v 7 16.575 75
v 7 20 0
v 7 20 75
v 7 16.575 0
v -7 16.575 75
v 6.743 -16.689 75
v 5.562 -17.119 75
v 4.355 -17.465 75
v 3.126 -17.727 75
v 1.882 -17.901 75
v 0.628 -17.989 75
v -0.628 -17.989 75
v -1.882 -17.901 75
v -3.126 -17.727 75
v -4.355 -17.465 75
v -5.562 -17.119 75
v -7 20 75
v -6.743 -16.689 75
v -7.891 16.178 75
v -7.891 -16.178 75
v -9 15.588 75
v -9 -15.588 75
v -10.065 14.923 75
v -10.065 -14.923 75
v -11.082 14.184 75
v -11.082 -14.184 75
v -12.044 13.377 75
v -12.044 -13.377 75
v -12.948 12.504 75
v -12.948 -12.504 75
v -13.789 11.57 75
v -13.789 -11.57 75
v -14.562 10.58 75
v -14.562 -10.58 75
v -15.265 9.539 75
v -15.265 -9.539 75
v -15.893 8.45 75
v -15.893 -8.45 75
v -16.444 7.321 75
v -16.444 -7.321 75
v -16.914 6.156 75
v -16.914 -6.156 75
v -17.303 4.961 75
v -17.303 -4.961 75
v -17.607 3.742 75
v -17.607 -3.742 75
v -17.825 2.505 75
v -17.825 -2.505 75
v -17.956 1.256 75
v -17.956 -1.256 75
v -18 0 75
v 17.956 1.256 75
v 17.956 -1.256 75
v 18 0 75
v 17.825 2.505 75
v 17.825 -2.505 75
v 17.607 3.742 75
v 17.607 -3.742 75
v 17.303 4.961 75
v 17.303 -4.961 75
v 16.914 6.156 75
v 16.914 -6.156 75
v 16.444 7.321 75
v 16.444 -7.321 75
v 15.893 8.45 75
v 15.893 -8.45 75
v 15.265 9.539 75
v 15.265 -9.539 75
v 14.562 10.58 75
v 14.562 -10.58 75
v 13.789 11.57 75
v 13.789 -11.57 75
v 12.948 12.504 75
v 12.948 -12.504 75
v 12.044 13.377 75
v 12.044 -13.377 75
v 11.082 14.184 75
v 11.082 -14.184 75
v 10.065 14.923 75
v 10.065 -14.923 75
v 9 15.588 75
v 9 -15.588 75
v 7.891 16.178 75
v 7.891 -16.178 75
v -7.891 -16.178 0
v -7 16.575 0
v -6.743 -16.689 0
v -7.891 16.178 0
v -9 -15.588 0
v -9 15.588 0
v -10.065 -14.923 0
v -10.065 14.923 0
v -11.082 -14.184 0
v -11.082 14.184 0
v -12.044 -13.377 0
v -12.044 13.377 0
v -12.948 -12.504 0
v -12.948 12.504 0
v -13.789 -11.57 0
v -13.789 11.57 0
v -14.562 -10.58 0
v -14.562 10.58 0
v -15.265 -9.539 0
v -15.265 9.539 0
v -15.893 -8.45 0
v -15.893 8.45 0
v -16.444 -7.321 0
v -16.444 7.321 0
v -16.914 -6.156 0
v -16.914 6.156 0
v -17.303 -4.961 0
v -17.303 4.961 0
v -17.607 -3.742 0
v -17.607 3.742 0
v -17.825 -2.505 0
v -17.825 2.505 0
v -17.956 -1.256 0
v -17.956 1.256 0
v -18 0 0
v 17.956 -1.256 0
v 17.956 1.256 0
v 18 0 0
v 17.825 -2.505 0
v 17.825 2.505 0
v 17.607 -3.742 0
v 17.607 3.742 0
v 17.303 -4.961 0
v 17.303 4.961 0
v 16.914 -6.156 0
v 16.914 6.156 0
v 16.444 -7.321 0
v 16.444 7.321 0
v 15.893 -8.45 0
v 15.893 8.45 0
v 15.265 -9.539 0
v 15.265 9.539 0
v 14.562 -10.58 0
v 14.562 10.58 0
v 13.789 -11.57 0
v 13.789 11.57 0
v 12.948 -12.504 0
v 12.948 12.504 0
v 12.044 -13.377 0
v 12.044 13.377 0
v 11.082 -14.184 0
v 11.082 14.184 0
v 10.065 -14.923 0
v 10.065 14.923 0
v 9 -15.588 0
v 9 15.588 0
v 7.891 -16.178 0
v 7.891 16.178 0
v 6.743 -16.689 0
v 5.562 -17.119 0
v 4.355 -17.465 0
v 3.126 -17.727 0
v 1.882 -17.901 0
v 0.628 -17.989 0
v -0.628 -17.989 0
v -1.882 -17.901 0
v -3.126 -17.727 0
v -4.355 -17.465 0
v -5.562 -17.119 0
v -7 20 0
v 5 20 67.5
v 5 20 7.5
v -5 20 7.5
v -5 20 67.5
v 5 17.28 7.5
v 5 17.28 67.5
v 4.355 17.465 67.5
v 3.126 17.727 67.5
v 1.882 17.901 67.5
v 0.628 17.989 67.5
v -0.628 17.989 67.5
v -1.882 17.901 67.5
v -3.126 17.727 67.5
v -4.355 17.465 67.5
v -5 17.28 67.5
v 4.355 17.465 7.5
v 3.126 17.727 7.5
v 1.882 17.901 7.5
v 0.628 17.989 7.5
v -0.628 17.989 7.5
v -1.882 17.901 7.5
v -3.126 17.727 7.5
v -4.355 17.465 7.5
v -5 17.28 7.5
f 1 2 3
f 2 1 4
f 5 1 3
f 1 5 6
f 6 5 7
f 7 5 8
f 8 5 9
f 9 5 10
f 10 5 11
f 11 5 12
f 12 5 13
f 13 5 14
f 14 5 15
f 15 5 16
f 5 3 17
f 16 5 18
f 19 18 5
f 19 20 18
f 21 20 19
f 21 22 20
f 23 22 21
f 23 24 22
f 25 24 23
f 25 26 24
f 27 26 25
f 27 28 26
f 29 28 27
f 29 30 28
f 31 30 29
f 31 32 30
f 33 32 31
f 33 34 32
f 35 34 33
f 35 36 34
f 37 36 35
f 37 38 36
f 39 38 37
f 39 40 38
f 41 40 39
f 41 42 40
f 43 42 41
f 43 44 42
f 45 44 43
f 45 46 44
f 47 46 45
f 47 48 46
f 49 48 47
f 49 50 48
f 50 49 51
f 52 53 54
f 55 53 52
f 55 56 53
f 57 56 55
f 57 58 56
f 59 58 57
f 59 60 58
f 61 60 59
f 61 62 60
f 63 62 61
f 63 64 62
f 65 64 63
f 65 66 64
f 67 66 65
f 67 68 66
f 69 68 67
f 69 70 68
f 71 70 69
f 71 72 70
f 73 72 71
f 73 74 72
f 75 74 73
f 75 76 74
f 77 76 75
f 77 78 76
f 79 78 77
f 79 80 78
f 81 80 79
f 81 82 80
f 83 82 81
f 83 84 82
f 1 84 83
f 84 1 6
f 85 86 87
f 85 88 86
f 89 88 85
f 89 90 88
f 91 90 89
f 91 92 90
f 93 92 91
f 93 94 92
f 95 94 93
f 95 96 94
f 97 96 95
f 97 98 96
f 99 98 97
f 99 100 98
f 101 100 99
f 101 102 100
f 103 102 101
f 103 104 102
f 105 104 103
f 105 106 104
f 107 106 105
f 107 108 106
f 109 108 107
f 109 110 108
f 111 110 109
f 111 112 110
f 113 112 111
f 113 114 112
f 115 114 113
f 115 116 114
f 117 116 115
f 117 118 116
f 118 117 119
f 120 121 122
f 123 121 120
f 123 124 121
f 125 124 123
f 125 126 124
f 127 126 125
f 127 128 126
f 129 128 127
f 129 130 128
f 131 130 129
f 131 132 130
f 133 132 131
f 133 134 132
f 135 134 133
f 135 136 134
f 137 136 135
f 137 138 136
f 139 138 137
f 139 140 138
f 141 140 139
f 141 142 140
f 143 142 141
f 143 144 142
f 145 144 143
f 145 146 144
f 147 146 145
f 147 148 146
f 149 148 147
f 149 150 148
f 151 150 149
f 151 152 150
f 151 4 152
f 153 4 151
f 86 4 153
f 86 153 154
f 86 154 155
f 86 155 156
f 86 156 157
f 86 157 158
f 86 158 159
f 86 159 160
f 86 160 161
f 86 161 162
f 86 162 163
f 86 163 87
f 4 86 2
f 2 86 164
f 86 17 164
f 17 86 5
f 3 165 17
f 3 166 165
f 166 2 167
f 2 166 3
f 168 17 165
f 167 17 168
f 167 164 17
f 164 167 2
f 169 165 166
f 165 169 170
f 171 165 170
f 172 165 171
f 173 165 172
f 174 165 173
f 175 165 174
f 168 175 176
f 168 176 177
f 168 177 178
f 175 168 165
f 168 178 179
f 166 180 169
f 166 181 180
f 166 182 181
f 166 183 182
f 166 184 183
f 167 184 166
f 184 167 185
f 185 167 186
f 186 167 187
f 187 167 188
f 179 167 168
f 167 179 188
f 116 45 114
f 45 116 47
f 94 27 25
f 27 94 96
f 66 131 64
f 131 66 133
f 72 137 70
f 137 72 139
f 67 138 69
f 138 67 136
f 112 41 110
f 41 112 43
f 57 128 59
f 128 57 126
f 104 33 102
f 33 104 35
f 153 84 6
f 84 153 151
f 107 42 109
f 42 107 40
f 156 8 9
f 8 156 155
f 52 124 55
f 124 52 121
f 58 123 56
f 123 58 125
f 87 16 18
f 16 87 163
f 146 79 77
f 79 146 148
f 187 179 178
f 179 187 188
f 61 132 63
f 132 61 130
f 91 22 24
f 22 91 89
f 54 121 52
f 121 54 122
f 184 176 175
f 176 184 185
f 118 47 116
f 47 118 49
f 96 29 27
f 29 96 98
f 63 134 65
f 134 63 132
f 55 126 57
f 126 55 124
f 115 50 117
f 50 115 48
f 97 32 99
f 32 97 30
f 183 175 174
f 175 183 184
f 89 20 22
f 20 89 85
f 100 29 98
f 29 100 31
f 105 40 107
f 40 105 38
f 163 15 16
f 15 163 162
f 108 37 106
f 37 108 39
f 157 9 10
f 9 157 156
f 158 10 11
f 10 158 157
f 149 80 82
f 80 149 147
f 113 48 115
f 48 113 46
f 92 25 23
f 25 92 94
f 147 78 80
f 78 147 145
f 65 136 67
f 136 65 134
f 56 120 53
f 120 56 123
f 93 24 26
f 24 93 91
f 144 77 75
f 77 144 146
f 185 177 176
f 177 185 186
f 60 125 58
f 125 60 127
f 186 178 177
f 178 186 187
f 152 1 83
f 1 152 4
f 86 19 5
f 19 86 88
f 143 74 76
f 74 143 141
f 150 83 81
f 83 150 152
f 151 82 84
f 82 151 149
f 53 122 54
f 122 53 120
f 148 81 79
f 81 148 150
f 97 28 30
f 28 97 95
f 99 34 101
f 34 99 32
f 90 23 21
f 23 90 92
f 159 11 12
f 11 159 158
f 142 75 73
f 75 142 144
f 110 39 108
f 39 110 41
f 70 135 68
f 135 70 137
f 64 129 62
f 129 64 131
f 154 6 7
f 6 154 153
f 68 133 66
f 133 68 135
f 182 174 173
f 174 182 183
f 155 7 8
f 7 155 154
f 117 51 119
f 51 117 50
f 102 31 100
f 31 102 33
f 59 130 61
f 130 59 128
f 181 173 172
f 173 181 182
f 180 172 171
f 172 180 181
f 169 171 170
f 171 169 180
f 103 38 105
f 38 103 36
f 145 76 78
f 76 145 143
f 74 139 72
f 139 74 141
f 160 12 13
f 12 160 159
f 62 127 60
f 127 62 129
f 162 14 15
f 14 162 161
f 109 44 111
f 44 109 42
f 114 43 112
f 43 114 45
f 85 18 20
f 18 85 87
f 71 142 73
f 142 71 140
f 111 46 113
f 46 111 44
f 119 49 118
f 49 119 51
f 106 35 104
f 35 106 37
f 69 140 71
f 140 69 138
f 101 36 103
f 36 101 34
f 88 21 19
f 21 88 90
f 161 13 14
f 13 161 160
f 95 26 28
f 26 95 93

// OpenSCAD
$fn = 90;
D_CENTER_OUTER = 36;

DZ = 75;
PLATE_DX = 10;
PLATE_DZ = 60;
BOX_DX = 14;
BOX_DZ = 75;

cylinder(h=DZ, d=D_CENTER_OUTER);

difference() {
    translate([-BOX_DX/2, 0, 0]) cube(size=[BOX_DX, 20, DZ]);
    translate([-PLATE_DX/2, 0, (DZ - PLATE_DZ)/2]) cube(size=[PLATE_DX, 20, PLATE_DZ]);
}
